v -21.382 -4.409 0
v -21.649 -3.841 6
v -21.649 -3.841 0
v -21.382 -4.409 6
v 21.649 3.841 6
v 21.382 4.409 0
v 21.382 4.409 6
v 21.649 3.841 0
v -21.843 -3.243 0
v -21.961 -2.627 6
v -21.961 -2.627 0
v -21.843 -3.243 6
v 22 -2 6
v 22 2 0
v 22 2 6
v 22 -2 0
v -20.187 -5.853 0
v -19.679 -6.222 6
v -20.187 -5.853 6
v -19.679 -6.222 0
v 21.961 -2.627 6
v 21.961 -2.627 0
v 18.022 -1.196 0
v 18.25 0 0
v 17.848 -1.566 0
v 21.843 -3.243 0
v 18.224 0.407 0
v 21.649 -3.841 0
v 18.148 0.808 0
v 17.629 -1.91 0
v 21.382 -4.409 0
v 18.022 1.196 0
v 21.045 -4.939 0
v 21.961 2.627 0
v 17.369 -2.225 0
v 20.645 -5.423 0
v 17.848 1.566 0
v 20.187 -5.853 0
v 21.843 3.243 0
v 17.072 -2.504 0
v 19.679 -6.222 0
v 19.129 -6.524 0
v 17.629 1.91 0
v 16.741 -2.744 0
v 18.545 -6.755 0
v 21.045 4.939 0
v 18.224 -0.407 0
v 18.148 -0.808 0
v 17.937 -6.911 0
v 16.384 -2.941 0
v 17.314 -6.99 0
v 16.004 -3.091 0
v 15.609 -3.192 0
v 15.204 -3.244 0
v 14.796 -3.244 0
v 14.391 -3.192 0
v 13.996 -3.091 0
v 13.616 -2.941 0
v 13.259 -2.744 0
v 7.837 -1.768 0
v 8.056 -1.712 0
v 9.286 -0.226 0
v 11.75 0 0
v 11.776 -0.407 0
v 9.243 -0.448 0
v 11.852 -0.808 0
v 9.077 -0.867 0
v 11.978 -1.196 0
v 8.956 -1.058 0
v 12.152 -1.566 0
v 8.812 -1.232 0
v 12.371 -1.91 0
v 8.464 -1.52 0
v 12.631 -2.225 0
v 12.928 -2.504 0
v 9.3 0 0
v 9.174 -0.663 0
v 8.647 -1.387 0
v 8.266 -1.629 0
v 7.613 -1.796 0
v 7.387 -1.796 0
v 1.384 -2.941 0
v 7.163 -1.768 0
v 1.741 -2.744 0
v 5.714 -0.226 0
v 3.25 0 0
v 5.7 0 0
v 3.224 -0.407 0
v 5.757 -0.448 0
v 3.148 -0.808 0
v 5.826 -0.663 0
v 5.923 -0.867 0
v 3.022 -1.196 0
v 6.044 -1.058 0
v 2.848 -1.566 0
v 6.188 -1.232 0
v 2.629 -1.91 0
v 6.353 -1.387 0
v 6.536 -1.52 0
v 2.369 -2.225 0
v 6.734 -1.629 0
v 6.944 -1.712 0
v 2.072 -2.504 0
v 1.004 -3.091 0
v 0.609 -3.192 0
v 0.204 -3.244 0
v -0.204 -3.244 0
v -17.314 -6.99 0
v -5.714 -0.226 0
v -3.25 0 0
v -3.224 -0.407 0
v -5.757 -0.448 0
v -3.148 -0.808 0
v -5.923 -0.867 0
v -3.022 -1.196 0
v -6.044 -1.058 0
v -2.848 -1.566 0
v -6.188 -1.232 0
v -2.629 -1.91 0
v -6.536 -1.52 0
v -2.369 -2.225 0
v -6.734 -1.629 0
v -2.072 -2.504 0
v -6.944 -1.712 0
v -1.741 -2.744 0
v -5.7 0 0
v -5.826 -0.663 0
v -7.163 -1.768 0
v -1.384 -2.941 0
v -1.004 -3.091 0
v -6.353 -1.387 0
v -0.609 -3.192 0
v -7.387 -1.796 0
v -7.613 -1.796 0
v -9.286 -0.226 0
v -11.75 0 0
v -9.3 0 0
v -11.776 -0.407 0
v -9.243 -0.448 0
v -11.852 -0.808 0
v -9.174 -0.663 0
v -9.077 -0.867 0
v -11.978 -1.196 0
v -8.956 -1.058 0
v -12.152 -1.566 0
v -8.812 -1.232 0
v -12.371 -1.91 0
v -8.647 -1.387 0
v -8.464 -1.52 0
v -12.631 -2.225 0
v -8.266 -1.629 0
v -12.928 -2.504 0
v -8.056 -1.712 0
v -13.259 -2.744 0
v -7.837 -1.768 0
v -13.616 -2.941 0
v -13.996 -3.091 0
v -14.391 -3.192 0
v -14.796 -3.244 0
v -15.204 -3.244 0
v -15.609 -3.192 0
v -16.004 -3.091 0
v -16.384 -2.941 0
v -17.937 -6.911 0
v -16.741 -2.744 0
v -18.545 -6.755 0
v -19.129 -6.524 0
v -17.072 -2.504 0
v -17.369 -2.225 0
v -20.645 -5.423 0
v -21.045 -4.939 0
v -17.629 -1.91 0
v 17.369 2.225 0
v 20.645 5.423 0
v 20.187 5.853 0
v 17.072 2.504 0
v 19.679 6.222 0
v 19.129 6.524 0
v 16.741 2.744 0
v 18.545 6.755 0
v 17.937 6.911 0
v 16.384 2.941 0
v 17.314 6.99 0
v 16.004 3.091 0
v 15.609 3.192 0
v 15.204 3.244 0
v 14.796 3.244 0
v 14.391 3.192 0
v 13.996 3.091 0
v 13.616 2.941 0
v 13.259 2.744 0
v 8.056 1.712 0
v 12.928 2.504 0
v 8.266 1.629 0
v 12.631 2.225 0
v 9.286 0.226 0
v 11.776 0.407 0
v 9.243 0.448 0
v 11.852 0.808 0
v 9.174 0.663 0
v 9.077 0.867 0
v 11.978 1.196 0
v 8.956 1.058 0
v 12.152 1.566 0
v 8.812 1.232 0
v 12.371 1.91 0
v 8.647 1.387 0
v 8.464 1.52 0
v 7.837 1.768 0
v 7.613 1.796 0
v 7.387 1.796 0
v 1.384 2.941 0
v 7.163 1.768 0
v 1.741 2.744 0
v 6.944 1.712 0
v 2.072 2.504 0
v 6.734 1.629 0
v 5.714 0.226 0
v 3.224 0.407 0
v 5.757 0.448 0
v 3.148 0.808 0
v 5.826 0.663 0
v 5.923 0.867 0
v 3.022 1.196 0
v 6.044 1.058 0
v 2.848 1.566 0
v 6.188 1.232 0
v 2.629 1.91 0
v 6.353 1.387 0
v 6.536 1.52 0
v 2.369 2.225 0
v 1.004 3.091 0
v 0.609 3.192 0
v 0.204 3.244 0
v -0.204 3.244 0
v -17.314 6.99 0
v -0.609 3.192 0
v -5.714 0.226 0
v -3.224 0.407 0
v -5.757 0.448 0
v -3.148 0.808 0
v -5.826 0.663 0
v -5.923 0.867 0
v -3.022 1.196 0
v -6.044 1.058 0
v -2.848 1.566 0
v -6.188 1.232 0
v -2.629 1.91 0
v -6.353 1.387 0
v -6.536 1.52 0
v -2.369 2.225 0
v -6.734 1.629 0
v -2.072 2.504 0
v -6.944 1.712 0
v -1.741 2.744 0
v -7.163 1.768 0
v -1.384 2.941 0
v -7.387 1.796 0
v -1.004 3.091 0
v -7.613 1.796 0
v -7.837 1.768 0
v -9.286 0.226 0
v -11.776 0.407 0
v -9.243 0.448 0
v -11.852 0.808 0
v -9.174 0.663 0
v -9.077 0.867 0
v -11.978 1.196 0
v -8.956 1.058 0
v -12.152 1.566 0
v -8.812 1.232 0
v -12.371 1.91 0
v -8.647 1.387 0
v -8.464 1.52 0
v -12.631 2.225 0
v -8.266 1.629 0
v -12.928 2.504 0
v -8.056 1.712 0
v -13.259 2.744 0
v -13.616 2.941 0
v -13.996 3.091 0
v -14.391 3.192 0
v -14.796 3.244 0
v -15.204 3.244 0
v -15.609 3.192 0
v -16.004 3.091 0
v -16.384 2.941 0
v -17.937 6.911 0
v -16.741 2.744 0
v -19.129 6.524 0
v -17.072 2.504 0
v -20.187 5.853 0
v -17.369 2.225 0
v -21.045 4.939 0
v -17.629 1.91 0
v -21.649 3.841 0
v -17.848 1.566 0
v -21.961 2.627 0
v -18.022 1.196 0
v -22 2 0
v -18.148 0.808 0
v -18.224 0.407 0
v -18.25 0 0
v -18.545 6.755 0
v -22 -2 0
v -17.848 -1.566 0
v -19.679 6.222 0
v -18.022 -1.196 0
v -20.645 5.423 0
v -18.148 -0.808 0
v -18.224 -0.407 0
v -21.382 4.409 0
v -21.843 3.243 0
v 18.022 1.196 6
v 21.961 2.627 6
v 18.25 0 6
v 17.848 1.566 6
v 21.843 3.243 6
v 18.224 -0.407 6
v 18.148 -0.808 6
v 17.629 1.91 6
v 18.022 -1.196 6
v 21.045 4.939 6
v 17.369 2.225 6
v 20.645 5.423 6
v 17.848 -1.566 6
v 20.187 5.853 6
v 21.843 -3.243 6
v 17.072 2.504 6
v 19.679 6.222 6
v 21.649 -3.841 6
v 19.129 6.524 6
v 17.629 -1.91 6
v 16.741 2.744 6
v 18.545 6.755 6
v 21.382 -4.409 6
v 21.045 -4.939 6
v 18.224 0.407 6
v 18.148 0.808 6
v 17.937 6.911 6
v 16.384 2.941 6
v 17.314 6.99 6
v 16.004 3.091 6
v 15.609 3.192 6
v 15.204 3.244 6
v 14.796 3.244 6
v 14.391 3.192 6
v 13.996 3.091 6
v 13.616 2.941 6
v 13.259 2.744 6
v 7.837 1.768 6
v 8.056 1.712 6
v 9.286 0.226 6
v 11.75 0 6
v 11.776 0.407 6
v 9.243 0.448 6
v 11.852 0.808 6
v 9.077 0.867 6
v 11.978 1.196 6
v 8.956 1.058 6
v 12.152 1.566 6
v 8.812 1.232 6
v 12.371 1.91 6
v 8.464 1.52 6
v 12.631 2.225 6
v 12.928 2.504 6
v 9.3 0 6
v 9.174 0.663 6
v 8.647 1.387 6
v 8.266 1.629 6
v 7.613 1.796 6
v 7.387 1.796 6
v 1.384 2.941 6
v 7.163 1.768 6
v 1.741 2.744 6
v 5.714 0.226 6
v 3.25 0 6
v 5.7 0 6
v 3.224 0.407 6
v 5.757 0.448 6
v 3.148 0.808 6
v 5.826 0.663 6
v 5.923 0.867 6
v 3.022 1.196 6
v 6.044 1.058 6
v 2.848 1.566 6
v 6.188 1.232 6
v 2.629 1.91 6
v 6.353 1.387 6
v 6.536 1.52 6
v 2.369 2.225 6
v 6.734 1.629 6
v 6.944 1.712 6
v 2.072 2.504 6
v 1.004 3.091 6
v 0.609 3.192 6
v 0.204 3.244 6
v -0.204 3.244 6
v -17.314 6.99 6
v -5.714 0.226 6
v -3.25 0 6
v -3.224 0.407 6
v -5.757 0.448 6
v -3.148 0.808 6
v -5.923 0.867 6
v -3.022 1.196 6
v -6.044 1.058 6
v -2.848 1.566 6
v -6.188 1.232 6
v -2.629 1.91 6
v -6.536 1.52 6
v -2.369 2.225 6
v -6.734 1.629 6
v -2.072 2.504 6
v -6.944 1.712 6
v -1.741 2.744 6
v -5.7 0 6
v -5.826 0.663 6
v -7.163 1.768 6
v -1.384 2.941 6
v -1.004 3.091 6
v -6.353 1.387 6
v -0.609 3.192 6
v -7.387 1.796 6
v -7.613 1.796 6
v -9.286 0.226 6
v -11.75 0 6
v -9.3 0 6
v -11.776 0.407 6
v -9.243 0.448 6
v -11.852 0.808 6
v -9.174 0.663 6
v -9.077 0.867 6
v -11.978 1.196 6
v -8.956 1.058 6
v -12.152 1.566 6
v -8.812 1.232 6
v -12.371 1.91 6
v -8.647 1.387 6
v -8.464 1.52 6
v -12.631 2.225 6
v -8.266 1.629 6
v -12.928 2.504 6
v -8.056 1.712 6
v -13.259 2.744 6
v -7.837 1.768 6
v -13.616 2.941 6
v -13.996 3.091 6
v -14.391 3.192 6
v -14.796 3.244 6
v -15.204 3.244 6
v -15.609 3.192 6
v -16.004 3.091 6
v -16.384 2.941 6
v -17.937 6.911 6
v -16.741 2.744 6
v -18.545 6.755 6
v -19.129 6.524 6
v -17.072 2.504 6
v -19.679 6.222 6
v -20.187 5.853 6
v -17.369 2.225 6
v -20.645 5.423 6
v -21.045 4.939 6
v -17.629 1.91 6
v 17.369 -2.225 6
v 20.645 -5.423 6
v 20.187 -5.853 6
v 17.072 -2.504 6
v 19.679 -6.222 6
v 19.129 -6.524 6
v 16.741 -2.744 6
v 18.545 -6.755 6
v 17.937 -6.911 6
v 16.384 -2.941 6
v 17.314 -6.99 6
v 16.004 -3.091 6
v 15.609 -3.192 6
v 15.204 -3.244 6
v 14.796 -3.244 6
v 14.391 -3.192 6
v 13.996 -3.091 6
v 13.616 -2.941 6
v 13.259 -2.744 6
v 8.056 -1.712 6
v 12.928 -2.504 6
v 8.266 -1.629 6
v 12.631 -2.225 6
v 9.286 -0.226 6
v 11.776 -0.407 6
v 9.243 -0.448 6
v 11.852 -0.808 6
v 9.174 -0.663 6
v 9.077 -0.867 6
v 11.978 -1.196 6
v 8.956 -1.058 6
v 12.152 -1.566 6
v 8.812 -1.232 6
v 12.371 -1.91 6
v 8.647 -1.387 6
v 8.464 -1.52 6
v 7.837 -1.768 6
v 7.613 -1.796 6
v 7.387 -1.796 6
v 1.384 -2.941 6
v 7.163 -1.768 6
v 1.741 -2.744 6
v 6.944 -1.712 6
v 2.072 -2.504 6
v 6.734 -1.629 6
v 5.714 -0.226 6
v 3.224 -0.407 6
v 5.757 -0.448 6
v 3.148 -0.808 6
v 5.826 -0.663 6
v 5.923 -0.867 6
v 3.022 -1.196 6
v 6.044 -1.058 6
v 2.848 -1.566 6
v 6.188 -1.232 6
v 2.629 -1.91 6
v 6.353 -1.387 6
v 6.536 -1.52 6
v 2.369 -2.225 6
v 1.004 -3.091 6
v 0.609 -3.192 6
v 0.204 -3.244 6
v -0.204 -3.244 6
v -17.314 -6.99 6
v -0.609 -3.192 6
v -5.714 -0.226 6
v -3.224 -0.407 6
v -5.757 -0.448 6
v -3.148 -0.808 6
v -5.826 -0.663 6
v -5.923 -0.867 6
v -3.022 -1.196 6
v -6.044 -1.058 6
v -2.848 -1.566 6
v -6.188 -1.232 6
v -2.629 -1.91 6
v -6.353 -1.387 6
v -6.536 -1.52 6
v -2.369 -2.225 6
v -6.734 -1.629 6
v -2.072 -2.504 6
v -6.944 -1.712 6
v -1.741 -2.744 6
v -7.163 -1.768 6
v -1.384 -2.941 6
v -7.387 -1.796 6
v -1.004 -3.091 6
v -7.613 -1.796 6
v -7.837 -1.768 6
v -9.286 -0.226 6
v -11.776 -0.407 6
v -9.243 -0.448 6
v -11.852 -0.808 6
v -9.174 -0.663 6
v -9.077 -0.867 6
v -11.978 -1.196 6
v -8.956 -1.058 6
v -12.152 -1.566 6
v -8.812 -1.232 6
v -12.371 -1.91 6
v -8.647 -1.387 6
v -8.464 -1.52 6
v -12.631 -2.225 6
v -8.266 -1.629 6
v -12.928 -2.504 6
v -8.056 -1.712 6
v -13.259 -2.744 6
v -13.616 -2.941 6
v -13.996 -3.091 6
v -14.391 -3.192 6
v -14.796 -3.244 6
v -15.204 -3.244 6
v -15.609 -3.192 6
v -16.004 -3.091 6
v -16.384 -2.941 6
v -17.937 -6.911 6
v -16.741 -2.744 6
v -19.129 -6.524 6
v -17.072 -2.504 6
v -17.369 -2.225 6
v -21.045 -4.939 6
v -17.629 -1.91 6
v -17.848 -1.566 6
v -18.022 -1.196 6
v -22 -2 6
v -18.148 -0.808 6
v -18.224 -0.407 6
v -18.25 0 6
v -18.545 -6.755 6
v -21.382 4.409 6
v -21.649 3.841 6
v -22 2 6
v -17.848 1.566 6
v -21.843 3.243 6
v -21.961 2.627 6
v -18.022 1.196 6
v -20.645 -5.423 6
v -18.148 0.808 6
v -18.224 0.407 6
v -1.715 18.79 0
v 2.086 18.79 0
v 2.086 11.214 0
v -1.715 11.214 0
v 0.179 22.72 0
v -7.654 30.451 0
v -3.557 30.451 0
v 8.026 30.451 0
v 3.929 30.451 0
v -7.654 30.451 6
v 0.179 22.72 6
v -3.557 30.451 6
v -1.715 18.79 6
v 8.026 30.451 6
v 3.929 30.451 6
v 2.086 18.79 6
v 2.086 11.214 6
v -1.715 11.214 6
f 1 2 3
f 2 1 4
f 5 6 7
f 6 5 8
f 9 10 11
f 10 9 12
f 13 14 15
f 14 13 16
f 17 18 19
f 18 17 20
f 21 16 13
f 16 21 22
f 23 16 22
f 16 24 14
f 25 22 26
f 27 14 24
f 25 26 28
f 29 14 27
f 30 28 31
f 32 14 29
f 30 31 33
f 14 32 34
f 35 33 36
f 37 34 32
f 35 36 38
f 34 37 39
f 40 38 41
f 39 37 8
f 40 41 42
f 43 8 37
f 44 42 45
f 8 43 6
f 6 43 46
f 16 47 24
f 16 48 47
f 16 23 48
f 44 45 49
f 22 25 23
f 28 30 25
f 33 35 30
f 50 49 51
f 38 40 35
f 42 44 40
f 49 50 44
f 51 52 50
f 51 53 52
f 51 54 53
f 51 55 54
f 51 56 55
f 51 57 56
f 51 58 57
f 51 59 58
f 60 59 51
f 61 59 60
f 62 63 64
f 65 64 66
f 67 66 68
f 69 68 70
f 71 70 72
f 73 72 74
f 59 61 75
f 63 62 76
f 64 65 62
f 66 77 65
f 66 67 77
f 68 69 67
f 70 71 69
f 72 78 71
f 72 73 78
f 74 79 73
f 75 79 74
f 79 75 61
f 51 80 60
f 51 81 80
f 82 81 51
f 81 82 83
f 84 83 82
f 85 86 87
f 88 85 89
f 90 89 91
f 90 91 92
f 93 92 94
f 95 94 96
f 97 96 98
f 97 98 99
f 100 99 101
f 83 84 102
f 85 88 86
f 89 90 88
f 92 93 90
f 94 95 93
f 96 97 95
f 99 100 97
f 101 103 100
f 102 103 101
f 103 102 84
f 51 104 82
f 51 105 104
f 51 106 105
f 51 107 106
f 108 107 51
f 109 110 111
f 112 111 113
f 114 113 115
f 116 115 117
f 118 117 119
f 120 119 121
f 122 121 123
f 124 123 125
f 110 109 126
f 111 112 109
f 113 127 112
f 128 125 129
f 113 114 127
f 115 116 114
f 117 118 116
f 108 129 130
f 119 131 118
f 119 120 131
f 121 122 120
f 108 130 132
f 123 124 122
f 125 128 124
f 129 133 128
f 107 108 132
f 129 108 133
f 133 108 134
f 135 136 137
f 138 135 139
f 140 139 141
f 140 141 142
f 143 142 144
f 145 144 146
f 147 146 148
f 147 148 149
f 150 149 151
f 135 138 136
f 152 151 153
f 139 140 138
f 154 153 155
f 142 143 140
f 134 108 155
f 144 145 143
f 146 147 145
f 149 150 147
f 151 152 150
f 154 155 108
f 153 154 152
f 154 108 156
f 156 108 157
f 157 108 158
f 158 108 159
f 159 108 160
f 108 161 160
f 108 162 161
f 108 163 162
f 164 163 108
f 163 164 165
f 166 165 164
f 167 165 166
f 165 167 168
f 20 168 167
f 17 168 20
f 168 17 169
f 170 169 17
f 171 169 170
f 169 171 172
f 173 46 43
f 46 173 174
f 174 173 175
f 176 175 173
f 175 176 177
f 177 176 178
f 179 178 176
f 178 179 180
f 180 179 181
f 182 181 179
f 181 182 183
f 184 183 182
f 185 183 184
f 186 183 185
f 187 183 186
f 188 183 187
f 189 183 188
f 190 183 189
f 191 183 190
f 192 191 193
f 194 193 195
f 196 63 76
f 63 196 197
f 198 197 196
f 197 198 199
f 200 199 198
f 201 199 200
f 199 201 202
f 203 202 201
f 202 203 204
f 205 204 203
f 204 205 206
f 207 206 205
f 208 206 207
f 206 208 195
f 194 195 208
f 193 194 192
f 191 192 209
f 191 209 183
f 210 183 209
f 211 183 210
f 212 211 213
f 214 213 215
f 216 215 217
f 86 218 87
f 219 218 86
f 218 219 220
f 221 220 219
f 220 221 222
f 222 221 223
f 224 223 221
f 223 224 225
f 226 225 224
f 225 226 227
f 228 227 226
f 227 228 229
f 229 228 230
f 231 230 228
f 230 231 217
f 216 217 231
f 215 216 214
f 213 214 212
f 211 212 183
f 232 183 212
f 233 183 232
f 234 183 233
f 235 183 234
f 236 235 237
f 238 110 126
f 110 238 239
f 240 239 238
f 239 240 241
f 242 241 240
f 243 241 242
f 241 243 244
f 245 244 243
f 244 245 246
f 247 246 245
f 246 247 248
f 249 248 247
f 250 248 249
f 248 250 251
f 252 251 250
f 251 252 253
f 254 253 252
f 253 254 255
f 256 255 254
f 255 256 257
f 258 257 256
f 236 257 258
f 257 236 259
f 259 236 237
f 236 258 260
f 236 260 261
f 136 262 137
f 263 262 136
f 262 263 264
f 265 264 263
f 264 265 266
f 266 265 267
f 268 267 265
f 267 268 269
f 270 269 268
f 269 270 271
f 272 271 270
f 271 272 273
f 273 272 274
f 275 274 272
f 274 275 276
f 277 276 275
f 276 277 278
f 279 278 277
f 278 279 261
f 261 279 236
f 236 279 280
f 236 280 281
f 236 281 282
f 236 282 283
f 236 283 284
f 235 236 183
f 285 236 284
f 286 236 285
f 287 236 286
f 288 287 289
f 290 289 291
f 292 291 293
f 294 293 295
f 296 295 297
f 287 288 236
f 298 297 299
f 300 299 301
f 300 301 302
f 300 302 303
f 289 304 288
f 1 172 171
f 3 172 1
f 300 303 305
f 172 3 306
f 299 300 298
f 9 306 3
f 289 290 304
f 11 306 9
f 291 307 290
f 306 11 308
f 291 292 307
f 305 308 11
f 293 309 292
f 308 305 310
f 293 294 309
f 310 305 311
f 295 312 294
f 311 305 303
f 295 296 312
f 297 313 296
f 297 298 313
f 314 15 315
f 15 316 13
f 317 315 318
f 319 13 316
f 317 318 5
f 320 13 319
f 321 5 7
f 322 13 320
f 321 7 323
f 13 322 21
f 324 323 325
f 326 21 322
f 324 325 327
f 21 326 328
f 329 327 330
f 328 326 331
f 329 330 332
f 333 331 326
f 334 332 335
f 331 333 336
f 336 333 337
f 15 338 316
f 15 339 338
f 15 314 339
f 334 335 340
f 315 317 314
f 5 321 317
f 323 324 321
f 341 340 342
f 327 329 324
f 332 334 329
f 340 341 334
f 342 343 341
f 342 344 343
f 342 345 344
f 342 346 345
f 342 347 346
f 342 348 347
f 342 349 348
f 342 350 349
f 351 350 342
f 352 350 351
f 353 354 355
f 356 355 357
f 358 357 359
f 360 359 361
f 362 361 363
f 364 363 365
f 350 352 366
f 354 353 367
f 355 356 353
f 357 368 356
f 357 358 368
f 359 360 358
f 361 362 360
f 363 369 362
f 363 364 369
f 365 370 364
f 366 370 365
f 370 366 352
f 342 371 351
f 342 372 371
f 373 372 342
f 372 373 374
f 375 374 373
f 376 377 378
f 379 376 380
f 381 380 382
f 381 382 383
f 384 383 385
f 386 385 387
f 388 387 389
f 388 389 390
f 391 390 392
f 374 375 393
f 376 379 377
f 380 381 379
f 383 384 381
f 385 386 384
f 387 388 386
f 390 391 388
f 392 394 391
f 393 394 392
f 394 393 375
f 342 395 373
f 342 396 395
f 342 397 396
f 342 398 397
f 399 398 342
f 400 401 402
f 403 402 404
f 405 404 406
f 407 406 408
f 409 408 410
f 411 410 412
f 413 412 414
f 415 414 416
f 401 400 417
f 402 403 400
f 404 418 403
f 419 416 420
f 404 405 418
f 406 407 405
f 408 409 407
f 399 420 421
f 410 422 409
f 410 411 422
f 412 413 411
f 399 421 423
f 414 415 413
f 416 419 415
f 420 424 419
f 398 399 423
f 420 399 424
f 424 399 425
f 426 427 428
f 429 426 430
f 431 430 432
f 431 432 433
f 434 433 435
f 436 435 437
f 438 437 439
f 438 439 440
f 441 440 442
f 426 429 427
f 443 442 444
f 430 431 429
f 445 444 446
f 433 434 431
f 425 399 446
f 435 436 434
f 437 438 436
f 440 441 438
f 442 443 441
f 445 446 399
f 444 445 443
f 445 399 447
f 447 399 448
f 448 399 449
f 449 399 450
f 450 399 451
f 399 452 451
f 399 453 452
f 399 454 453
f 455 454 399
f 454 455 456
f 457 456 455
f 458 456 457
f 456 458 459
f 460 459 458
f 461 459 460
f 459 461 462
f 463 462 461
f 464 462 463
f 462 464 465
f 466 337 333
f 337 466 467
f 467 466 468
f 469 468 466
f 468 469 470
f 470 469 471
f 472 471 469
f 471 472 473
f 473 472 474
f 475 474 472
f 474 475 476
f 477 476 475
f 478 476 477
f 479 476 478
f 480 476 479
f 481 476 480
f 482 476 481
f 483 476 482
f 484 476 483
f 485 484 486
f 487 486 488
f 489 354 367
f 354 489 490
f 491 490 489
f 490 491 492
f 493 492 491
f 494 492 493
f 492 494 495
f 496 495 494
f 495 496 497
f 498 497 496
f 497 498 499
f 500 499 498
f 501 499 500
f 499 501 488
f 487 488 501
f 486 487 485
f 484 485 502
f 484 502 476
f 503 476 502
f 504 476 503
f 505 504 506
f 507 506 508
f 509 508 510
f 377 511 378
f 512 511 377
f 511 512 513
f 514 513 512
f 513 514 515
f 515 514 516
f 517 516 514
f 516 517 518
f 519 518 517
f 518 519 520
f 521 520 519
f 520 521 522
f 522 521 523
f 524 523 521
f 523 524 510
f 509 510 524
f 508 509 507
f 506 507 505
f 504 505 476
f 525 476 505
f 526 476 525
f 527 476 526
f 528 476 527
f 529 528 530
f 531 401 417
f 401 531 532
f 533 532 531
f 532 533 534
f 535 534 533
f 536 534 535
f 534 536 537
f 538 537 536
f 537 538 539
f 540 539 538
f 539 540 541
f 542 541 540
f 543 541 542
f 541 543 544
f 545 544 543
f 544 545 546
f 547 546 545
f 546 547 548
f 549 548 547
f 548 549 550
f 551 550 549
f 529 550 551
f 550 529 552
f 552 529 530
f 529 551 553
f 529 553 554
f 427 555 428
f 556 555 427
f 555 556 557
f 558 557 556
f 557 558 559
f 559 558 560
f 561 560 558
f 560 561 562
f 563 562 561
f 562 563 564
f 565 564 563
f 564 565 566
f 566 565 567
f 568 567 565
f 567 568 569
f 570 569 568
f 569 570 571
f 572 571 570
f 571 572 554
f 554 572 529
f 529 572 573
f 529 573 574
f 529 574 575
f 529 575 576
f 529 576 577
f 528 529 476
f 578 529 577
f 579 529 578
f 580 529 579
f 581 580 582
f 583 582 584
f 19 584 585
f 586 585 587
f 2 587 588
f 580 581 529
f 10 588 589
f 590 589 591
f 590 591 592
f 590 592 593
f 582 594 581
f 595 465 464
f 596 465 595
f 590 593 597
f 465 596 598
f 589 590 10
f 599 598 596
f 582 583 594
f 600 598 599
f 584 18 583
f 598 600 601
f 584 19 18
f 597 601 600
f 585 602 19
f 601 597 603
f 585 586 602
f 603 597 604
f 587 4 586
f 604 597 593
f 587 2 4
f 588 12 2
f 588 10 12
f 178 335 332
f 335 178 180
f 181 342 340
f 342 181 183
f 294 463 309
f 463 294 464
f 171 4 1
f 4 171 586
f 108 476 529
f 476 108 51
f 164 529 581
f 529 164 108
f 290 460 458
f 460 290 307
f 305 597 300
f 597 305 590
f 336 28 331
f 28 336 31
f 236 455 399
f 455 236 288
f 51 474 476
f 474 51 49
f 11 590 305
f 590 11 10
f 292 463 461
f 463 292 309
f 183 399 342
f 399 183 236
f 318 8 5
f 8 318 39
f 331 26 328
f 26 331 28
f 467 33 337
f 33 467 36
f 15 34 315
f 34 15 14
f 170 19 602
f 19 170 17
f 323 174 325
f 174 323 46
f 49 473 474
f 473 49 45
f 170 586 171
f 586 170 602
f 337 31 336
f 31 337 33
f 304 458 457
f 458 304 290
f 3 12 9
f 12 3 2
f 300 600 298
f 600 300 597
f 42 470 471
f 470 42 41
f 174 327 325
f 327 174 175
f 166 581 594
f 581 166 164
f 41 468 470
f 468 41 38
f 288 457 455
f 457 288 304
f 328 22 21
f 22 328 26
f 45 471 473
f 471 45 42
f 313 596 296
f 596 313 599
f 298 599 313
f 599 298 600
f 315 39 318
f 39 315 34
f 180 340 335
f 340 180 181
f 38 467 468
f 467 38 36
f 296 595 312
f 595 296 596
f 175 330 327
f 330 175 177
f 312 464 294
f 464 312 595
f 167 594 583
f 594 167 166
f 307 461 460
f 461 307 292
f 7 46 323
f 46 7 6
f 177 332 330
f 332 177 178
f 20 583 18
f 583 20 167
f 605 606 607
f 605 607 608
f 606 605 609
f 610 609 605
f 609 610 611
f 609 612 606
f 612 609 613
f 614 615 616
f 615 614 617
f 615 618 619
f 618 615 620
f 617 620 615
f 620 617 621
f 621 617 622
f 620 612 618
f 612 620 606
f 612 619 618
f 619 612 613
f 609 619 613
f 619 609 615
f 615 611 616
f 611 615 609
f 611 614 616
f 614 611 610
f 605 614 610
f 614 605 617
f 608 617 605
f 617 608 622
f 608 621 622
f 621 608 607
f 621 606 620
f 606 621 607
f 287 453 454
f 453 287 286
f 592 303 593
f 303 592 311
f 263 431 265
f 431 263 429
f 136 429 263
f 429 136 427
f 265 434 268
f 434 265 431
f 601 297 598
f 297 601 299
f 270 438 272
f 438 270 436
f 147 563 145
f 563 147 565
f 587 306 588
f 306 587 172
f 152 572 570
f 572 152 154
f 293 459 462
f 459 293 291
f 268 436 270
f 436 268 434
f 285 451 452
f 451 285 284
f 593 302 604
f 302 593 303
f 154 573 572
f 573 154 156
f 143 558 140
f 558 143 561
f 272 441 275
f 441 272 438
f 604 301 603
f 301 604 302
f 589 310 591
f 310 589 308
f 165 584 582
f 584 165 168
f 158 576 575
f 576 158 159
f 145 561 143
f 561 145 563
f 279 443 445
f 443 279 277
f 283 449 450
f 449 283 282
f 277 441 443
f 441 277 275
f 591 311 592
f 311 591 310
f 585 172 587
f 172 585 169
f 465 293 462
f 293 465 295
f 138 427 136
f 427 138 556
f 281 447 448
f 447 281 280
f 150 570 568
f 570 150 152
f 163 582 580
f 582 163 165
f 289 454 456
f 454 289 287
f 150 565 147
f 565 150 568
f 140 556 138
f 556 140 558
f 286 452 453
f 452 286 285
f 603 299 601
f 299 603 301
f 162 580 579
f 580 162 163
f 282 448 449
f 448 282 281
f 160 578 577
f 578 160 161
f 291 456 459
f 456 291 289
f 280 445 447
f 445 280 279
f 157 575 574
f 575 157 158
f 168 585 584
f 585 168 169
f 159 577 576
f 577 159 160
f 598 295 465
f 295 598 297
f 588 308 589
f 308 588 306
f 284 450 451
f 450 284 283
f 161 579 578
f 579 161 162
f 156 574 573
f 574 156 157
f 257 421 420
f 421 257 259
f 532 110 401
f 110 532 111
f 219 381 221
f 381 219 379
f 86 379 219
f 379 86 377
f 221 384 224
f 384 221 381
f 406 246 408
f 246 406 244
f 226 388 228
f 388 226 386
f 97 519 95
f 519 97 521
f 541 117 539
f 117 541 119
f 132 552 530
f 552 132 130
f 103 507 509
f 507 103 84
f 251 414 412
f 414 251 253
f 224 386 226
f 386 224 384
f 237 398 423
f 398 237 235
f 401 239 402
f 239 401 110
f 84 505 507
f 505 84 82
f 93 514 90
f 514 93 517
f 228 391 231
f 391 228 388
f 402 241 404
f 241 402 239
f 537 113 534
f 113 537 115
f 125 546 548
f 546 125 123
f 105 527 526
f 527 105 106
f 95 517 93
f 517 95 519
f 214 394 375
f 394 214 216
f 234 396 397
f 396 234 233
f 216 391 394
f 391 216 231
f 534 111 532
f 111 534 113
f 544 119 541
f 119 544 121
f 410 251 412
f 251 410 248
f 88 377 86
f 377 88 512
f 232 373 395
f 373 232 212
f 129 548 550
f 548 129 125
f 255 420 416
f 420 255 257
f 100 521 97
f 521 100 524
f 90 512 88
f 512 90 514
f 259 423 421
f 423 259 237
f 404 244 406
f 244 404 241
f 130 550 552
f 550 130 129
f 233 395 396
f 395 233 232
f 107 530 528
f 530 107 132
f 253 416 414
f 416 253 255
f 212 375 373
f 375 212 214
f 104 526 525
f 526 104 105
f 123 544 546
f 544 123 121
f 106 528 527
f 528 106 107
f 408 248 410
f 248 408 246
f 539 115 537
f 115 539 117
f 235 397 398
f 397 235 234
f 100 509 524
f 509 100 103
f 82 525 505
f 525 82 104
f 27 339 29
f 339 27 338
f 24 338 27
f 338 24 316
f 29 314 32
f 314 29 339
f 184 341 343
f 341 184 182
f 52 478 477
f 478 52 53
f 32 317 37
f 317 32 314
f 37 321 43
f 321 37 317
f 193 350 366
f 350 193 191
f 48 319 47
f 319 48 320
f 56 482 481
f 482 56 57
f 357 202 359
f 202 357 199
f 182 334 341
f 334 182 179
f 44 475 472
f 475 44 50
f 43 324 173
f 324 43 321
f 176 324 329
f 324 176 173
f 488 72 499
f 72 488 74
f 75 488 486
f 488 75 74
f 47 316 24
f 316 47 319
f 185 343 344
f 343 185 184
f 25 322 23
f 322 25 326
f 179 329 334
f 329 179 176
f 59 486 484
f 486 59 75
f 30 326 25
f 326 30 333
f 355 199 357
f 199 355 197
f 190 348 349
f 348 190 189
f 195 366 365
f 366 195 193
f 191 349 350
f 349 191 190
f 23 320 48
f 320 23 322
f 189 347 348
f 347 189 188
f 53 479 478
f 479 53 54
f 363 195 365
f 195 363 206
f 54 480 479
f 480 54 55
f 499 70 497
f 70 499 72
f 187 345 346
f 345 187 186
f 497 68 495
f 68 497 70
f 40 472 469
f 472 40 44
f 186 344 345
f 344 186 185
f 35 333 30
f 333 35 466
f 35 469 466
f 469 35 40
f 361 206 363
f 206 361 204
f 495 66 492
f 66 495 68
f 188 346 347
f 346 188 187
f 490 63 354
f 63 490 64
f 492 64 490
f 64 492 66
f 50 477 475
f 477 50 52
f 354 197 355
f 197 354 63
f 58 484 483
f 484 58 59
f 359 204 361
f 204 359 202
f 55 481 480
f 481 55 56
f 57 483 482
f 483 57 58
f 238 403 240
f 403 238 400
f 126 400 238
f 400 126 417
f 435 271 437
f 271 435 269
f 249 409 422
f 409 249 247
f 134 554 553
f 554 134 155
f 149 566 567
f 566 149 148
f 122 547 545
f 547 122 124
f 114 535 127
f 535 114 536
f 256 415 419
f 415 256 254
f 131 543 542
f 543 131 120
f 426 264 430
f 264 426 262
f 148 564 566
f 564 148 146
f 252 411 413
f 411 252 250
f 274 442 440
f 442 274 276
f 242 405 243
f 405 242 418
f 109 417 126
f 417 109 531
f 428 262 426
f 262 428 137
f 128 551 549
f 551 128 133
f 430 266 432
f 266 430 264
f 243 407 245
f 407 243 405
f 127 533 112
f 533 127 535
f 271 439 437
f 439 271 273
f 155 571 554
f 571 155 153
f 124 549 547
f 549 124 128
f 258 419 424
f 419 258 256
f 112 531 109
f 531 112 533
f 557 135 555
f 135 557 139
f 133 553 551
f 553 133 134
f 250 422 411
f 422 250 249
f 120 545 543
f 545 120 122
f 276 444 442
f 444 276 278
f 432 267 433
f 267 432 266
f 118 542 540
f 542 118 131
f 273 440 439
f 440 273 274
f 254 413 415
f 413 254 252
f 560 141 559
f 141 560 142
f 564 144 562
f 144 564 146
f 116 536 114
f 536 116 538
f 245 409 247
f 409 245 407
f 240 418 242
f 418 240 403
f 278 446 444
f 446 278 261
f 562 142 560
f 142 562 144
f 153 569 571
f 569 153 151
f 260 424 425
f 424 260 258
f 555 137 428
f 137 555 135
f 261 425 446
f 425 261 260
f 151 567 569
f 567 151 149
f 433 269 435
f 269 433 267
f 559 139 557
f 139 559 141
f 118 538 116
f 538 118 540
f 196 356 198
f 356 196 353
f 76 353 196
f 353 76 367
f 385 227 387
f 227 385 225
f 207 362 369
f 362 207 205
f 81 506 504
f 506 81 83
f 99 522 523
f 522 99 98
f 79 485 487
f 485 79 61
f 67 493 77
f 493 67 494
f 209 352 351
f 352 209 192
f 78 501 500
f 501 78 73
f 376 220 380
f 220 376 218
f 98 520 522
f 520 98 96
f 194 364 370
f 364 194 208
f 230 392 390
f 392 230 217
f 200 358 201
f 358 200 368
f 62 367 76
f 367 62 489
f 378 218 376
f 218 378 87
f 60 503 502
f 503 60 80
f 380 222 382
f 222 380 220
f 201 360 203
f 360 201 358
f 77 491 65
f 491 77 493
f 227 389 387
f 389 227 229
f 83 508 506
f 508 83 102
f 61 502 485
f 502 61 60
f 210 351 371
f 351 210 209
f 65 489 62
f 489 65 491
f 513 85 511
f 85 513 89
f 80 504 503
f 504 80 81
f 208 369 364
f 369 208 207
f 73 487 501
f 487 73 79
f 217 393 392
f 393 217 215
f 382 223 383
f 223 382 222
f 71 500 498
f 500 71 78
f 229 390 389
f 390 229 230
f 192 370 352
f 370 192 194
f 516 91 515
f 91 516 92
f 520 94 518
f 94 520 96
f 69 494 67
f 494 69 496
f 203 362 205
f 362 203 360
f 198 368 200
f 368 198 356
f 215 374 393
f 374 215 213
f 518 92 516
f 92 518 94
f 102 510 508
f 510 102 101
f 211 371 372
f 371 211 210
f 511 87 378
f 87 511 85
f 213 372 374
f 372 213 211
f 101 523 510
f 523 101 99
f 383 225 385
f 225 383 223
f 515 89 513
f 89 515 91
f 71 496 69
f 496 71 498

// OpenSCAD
$fn = 50;


difference() {
	union() {
		hull() {
			translate(v = [-17.0000000000, 2.0000000000, 0]) {
				cylinder(h = 6, r = 5);
			}
			translate(v = [17.0000000000, 2.0000000000, 0]) {
				cylinder(h = 6, r = 5);
			}
			translate(v = [-17.0000000000, -2.0000000000, 0]) {
				cylinder(h = 6, r = 5);
			}
			translate(v = [17.0000000000, -2.0000000000, 0]) {
				cylinder(h = 6, r = 5);
			}
		}
		translate(v = [0, 30.0000000000, 0]) {
			linear_extrude(height = 6) {
				text(font = "DejaVu Sans Mono:style=Bold", halign = "center", size = 19.0000000000, text = "Y", valign = "top");
			}
		}
	}
	union() {
		translate(v = [-15.0000000000, 0.0000000000, 0]) {
			translate(v = [0, 0, -100]) {
				cylinder(h = 200, r = 3.2500000000);
			}
		}
		translate(v = [0, 0, -100]) {
			cylinder(h = 200, r = 3.2500000000);
		}
		translate(v = [15.0000000000, 0.0000000000, 0]) {
			translate(v = [0, 0, -100]) {
				cylinder(h = 200, r = 3.2500000000);
			}
		}
		translate(v = [-15.0000000000, 0.0000000000, 0]) {
			translate(v = [0, 0, -100]) {
				cylinder(h = 200, r = 1.8000000000);
			}
		}
		translate(v = [-7.5000000000, 0.0000000000, 0]) {
			translate(v = [0, 0, -100]) {
				cylinder(h = 200, r = 1.8000000000);
			}
		}
		translate(v = [0, 0, -100]) {
			cylinder(h = 200, r = 1.8000000000);
		}
		translate(v = [7.5000000000, 0.0000000000, 0]) {
			translate(v = [0, 0, -100]) {
				cylinder(h = 200, r = 1.8000000000);
			}
		}
		translate(v = [15.0000000000, 0.0000000000, 0]) {
			translate(v = [0, 0, -100]) {
				cylinder(h = 200, r = 1.8000000000);
			}
		}
	}
}
